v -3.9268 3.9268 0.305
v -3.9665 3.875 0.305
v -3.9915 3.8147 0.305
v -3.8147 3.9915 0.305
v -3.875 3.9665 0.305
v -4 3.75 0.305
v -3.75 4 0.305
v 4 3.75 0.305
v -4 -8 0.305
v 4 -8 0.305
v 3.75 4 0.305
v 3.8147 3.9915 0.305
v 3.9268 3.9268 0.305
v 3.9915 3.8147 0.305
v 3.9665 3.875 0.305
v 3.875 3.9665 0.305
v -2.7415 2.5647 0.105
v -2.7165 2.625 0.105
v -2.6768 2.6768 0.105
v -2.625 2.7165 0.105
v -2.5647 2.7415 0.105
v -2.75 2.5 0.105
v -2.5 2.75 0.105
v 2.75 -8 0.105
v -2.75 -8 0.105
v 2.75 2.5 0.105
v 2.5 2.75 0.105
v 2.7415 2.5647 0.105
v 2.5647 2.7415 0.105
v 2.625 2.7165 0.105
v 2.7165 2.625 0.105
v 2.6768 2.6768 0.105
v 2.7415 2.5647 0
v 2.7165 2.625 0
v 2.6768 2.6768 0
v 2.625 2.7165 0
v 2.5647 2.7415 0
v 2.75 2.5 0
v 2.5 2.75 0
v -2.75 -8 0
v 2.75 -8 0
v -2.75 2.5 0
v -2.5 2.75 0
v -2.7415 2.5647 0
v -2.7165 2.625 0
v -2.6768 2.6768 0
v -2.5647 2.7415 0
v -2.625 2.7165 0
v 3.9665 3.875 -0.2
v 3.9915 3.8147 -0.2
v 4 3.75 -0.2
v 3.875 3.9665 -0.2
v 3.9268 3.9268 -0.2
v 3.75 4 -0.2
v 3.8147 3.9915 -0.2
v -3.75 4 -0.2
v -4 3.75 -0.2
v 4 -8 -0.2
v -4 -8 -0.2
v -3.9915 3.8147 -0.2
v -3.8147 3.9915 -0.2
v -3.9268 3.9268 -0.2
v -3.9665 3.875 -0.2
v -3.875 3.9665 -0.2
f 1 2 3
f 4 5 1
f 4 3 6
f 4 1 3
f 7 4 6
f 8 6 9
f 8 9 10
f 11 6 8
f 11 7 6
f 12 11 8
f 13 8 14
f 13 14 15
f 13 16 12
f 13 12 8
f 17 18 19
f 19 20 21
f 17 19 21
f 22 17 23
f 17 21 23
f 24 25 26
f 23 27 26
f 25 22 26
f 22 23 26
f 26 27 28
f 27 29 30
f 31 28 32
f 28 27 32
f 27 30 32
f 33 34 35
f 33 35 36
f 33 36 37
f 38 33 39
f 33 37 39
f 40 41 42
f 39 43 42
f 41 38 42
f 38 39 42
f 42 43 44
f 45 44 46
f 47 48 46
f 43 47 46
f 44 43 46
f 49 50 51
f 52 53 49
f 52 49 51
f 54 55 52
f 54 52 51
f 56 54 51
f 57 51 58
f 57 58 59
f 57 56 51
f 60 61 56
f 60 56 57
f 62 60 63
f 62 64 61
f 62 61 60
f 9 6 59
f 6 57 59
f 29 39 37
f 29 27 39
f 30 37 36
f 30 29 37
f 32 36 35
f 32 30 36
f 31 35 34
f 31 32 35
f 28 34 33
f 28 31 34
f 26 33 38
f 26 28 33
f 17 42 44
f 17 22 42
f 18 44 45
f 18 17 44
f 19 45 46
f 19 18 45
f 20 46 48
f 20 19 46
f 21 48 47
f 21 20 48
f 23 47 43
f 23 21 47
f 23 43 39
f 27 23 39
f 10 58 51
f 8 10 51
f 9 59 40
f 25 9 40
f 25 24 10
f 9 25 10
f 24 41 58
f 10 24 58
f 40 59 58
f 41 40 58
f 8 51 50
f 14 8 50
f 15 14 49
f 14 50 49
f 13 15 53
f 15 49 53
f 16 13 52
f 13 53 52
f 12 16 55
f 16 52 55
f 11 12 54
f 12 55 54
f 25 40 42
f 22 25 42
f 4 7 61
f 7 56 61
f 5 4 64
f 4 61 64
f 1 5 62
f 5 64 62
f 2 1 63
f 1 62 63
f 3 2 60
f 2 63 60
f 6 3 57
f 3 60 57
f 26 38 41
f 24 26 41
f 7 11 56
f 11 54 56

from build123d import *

# Parameters (mm, degrees)
SKETCH1_W           = 1.25
SKETCH1_H           = 4
BOSS_EXTRUDE1_DEPTH = 0.105
FILLET1_R           = 0.25
BOSS_EXTRUDE2_DEPTH = 0.2
BOSS_EXTRUDE3_DEPTH = 0.2


with BuildPart() as part:
    # Sketch1 → Boss-Extrude1 (new body)
    with BuildSketch(Plane.XY):
        with Locations((3.375, -6)):
            Rectangle(SKETCH1_W, SKETCH1_H)
        Polygon((-2.75, -4), (-2.75, -2.75), (-2.75, 2.75), (2.75, 2.75), (2.75, -2.75), (2.75, -4), (4, -4), (4, 4), (-4, 4), (-4, -4), align=None)
        with Locations((-3.375, -6)):
            Rectangle(SKETCH1_W, SKETCH1_H)
    extrude(amount=BOSS_EXTRUDE1_DEPTH)

    # Fillet1
    fillet1_edges = [part.edges().sort_by_distance(p)[0] for p in [
        (2.75, 2.75, 0.0525),
        (-2.75, 2.75, 0.0525),
        (-4, 4, 0.0525),
        (4, 4, 0.0525),
    ]]
    fillet(fillet1_edges, radius=FILLET1_R)

    # Sketch2 → Boss-Extrude2 (add)
    with BuildSketch(Plane(origin=(0, 0, 0), x_dir=(-1, 0, 0), z_dir=(0, 0, -1))):
        with BuildLine():
            Line((2.75, -8), (4, -8))
            Line((4, -8), (4, 3.75))
            ThreePointArc((4, 3.75), (3.926776695, 3.926776695), (3.75, 4))
            Line((3.75, 4), (-3.75, 4))
            ThreePointArc((-3.75, 4), (-3.926776695, 3.926776695), (-4, 3.75))
            Line((-4, 3.75), (-4, -8))
            Line((-4, -8), (-2.75, -8))
            Line((-2.75, -8), (-2.75, 2.5))
            ThreePointArc((-2.75, 2.5), (-2.676776695, 2.676776695), (-2.5, 2.75))
            Line((-2.5, 2.75), (2.5, 2.75))
            ThreePointArc((2.5, 2.75), (2.676776695, 2.676776695), (2.75, 2.5))
            Line((2.75, 2.5), (2.75, -8))
        make_face()
        with BuildLine():
            Line((-2.75, -8), (2.75, -8))
            Line((2.75, -8), (2.75, 2.5))
            ThreePointArc((2.75, 2.5), (2.676776695, 2.676776695), (2.5, 2.75))
            Line((2.5, 2.75), (-2.5, 2.75))
            ThreePointArc((-2.5, 2.75), (-2.676776695, 2.676776695), (-2.75, 2.5))
            Line((-2.75, 2.5), (-2.75, -8))
        make_face()
    extrude(amount=BOSS_EXTRUDE2_DEPTH)

    # Sketch4 → Boss-Extrude3 (add)
    with BuildSketch(Plane.XY.offset(0.105)):
        with BuildLine():
            ThreePointArc((4, 3.75), (3.926776695, 3.926776695), (3.75, 4))
            Line((3.75, 4), (-3.75, 4))
            ThreePointArc((-3.75, 4), (-3.926776695, 3.926776695), (-4, 3.75))
            Line((-4, 3.75), (-4, -8))
            Line((-4, -8), (-2.75, -8))
            Line((-2.75, -8), (-2.75, 2.5))
            ThreePointArc((-2.75, 2.5), (-2.676776695, 2.676776695), (-2.5, 2.75))
            Line((-2.5, 2.75), (2.5, 2.75))
            ThreePointArc((2.5, 2.75), (2.676776695, 2.676776695), (2.75, 2.5))
            Line((2.75, 2.5), (2.75, -8))
            Line((2.75, -8), (4, -8))
            Line((4, -8), (4, 3.75))
        make_face()
        with BuildLine():
            Line((-2.75, -8), (2.75, -8))
            Line((2.75, -8), (2.75, 2.5))
            ThreePointArc((2.75, 2.5), (2.676776695, 2.676776695), (2.5, 2.75))
            Line((2.5, 2.75), (-2.5, 2.75))
            ThreePointArc((-2.5, 2.75), (-2.676776695, 2.676776695), (-2.75, 2.5))
            Line((-2.75, 2.5), (-2.75, -8))
        make_face()
    extrude(amount=BOSS_EXTRUDE3_DEPTH)


solid = part.part
